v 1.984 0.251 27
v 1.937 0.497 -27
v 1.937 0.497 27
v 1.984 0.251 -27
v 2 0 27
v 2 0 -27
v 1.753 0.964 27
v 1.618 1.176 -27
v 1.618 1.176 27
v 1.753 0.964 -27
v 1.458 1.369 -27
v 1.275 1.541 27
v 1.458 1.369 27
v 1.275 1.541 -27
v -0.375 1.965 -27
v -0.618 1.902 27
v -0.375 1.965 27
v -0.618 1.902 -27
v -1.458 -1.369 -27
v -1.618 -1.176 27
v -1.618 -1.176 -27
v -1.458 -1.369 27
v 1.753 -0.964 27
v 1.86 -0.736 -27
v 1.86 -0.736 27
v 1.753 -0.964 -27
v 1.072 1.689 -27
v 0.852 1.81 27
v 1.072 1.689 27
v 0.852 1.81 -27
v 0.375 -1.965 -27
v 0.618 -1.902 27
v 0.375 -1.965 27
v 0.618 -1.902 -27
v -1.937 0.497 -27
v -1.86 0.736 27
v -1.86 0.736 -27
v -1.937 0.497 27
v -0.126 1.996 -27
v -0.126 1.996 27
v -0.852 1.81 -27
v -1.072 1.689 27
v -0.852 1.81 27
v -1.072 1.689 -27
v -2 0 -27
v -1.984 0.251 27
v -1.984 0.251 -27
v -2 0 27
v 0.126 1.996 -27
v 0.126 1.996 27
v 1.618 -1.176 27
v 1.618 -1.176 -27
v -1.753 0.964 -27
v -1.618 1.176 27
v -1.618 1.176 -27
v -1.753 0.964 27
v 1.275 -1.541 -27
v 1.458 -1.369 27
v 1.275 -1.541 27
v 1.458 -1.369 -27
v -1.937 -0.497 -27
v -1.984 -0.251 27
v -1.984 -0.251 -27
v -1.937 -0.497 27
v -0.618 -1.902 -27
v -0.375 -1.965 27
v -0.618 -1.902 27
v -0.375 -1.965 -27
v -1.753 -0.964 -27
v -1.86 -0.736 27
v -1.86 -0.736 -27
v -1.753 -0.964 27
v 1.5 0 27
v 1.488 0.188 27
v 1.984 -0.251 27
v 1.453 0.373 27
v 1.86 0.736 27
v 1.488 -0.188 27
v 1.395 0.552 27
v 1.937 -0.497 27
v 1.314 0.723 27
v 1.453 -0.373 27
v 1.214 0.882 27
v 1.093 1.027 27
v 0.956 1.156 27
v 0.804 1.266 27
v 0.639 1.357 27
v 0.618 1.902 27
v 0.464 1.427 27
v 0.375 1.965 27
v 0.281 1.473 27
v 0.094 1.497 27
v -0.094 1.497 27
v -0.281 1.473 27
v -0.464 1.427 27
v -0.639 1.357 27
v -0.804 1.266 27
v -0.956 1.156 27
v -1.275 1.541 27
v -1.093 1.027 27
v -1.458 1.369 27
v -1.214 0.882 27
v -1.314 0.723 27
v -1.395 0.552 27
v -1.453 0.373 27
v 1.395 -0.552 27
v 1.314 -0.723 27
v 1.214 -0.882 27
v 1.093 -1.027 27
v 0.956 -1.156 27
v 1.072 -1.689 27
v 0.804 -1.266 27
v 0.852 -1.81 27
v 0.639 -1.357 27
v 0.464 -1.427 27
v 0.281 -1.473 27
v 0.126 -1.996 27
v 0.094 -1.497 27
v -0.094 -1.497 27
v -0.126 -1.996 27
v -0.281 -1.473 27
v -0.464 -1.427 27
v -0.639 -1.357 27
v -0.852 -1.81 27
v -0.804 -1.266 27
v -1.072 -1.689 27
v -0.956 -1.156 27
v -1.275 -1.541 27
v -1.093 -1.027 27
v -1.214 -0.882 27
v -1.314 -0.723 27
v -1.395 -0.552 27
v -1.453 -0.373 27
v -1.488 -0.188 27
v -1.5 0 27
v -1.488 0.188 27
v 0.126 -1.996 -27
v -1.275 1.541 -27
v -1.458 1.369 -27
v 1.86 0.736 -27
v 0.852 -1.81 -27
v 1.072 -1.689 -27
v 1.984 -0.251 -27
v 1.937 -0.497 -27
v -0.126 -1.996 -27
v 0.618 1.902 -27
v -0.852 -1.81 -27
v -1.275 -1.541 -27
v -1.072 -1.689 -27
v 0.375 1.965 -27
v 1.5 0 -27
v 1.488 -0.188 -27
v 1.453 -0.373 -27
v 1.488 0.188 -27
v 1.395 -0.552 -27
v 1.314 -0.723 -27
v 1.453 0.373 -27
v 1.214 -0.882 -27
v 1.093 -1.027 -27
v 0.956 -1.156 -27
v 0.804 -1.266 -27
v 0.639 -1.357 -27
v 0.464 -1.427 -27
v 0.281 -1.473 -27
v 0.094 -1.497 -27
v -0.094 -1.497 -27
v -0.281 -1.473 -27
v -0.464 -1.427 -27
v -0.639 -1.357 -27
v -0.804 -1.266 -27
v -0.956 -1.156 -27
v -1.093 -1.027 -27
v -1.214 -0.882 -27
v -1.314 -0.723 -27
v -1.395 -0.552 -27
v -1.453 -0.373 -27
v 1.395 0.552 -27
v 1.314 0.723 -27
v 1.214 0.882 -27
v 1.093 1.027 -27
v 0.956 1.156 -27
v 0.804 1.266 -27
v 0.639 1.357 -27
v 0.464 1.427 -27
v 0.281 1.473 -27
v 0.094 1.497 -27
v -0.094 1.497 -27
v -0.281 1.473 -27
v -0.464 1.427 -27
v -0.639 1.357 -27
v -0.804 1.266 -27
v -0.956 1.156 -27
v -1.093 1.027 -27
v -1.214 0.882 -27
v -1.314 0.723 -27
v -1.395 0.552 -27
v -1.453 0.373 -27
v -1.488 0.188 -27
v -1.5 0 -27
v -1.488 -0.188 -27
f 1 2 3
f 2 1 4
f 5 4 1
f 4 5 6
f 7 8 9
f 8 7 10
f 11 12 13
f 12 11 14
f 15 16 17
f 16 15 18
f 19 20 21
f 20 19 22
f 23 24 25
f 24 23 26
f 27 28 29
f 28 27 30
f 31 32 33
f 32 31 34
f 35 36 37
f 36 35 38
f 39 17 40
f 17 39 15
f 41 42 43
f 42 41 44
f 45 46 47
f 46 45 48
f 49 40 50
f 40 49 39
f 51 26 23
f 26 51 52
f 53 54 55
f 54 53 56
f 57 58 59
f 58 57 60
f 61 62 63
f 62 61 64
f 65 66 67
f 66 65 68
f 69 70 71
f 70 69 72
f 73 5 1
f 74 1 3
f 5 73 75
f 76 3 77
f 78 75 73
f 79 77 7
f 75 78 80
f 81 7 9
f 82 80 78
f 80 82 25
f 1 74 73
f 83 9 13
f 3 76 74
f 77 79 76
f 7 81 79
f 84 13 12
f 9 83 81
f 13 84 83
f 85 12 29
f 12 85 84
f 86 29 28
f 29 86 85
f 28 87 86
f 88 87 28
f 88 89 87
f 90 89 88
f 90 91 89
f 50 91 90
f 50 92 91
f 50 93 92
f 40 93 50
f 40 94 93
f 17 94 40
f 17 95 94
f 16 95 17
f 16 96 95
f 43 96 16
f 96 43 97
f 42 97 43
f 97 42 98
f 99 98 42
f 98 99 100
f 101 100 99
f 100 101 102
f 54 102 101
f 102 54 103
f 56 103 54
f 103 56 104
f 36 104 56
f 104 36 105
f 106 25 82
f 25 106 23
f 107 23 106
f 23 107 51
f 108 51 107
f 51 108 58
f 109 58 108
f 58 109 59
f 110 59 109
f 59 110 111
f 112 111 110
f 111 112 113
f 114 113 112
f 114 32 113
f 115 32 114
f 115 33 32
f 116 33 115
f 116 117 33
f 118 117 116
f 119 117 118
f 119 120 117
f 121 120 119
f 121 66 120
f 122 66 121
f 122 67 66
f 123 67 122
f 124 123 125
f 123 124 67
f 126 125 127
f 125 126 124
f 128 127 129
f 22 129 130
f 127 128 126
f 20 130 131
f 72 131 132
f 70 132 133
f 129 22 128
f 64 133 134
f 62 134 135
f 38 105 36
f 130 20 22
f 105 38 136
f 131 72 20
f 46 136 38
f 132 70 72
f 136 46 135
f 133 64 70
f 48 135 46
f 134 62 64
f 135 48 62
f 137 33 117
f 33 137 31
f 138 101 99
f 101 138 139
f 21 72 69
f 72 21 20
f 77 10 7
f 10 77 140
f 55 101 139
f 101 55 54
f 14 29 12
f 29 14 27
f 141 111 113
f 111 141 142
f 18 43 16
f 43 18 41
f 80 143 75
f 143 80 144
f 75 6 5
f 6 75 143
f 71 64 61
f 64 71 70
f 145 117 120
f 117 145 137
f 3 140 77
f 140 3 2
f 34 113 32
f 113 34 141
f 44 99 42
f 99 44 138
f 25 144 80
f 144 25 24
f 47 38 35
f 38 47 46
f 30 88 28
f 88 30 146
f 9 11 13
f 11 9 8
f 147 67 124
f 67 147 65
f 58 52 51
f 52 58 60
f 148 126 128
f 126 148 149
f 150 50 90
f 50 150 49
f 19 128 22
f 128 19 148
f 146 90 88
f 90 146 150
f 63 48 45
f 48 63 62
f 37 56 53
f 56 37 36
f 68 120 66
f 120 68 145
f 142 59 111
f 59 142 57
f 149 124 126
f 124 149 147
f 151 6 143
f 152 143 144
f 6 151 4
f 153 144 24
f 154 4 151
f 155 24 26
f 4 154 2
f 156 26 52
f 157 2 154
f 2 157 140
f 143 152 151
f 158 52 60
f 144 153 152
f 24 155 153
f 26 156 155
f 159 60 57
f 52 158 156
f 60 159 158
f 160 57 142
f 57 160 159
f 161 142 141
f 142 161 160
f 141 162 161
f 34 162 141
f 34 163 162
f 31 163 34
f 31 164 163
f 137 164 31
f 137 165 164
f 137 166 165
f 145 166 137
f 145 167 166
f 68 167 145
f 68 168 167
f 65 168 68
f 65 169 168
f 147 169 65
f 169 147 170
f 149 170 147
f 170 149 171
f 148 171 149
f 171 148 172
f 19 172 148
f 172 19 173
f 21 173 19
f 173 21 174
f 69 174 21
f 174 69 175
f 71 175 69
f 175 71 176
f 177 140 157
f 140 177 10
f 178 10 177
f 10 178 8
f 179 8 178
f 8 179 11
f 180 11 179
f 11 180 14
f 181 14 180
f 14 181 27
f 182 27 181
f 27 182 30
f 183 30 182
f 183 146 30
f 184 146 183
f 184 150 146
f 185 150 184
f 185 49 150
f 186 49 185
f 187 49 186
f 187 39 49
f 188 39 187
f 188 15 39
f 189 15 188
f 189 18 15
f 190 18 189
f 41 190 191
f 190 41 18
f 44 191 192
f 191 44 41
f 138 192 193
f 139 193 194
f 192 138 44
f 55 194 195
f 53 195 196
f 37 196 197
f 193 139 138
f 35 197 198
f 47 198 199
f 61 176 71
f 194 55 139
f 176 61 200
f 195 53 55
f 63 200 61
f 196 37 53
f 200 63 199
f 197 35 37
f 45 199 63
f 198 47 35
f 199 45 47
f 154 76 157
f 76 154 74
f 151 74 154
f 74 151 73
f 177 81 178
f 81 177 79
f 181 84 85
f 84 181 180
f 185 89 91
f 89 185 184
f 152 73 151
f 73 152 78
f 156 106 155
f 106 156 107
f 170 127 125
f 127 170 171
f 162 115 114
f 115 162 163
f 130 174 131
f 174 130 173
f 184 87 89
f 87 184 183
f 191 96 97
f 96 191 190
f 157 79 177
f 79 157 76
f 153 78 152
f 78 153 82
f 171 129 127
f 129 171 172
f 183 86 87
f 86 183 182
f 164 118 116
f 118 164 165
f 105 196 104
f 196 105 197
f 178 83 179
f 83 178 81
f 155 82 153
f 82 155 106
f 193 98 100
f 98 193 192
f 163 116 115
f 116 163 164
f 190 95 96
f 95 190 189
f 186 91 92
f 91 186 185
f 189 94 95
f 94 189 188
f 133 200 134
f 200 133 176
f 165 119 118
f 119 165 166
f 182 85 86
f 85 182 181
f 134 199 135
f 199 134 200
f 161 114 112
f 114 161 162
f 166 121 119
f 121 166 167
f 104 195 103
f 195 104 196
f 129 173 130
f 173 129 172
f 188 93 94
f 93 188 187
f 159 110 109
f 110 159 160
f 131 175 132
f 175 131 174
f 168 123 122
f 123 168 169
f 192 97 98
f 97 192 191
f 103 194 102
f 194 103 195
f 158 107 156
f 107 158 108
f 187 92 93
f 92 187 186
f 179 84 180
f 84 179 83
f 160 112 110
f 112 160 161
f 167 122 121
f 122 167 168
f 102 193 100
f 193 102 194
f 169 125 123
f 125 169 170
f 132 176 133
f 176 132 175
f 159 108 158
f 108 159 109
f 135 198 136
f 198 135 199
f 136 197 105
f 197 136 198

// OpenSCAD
$fn = 50;


difference() {
	union() {
		translate(v = [0, 0, -27.0000000000]) {
			cylinder(h = 54, r = 2.0000000000);
		}
	}
	union() {
		translate(v = [0, 0, -100.0000000000]) {
			cylinder(h = 200, r = 1.5000000000);
		}
	}
}
